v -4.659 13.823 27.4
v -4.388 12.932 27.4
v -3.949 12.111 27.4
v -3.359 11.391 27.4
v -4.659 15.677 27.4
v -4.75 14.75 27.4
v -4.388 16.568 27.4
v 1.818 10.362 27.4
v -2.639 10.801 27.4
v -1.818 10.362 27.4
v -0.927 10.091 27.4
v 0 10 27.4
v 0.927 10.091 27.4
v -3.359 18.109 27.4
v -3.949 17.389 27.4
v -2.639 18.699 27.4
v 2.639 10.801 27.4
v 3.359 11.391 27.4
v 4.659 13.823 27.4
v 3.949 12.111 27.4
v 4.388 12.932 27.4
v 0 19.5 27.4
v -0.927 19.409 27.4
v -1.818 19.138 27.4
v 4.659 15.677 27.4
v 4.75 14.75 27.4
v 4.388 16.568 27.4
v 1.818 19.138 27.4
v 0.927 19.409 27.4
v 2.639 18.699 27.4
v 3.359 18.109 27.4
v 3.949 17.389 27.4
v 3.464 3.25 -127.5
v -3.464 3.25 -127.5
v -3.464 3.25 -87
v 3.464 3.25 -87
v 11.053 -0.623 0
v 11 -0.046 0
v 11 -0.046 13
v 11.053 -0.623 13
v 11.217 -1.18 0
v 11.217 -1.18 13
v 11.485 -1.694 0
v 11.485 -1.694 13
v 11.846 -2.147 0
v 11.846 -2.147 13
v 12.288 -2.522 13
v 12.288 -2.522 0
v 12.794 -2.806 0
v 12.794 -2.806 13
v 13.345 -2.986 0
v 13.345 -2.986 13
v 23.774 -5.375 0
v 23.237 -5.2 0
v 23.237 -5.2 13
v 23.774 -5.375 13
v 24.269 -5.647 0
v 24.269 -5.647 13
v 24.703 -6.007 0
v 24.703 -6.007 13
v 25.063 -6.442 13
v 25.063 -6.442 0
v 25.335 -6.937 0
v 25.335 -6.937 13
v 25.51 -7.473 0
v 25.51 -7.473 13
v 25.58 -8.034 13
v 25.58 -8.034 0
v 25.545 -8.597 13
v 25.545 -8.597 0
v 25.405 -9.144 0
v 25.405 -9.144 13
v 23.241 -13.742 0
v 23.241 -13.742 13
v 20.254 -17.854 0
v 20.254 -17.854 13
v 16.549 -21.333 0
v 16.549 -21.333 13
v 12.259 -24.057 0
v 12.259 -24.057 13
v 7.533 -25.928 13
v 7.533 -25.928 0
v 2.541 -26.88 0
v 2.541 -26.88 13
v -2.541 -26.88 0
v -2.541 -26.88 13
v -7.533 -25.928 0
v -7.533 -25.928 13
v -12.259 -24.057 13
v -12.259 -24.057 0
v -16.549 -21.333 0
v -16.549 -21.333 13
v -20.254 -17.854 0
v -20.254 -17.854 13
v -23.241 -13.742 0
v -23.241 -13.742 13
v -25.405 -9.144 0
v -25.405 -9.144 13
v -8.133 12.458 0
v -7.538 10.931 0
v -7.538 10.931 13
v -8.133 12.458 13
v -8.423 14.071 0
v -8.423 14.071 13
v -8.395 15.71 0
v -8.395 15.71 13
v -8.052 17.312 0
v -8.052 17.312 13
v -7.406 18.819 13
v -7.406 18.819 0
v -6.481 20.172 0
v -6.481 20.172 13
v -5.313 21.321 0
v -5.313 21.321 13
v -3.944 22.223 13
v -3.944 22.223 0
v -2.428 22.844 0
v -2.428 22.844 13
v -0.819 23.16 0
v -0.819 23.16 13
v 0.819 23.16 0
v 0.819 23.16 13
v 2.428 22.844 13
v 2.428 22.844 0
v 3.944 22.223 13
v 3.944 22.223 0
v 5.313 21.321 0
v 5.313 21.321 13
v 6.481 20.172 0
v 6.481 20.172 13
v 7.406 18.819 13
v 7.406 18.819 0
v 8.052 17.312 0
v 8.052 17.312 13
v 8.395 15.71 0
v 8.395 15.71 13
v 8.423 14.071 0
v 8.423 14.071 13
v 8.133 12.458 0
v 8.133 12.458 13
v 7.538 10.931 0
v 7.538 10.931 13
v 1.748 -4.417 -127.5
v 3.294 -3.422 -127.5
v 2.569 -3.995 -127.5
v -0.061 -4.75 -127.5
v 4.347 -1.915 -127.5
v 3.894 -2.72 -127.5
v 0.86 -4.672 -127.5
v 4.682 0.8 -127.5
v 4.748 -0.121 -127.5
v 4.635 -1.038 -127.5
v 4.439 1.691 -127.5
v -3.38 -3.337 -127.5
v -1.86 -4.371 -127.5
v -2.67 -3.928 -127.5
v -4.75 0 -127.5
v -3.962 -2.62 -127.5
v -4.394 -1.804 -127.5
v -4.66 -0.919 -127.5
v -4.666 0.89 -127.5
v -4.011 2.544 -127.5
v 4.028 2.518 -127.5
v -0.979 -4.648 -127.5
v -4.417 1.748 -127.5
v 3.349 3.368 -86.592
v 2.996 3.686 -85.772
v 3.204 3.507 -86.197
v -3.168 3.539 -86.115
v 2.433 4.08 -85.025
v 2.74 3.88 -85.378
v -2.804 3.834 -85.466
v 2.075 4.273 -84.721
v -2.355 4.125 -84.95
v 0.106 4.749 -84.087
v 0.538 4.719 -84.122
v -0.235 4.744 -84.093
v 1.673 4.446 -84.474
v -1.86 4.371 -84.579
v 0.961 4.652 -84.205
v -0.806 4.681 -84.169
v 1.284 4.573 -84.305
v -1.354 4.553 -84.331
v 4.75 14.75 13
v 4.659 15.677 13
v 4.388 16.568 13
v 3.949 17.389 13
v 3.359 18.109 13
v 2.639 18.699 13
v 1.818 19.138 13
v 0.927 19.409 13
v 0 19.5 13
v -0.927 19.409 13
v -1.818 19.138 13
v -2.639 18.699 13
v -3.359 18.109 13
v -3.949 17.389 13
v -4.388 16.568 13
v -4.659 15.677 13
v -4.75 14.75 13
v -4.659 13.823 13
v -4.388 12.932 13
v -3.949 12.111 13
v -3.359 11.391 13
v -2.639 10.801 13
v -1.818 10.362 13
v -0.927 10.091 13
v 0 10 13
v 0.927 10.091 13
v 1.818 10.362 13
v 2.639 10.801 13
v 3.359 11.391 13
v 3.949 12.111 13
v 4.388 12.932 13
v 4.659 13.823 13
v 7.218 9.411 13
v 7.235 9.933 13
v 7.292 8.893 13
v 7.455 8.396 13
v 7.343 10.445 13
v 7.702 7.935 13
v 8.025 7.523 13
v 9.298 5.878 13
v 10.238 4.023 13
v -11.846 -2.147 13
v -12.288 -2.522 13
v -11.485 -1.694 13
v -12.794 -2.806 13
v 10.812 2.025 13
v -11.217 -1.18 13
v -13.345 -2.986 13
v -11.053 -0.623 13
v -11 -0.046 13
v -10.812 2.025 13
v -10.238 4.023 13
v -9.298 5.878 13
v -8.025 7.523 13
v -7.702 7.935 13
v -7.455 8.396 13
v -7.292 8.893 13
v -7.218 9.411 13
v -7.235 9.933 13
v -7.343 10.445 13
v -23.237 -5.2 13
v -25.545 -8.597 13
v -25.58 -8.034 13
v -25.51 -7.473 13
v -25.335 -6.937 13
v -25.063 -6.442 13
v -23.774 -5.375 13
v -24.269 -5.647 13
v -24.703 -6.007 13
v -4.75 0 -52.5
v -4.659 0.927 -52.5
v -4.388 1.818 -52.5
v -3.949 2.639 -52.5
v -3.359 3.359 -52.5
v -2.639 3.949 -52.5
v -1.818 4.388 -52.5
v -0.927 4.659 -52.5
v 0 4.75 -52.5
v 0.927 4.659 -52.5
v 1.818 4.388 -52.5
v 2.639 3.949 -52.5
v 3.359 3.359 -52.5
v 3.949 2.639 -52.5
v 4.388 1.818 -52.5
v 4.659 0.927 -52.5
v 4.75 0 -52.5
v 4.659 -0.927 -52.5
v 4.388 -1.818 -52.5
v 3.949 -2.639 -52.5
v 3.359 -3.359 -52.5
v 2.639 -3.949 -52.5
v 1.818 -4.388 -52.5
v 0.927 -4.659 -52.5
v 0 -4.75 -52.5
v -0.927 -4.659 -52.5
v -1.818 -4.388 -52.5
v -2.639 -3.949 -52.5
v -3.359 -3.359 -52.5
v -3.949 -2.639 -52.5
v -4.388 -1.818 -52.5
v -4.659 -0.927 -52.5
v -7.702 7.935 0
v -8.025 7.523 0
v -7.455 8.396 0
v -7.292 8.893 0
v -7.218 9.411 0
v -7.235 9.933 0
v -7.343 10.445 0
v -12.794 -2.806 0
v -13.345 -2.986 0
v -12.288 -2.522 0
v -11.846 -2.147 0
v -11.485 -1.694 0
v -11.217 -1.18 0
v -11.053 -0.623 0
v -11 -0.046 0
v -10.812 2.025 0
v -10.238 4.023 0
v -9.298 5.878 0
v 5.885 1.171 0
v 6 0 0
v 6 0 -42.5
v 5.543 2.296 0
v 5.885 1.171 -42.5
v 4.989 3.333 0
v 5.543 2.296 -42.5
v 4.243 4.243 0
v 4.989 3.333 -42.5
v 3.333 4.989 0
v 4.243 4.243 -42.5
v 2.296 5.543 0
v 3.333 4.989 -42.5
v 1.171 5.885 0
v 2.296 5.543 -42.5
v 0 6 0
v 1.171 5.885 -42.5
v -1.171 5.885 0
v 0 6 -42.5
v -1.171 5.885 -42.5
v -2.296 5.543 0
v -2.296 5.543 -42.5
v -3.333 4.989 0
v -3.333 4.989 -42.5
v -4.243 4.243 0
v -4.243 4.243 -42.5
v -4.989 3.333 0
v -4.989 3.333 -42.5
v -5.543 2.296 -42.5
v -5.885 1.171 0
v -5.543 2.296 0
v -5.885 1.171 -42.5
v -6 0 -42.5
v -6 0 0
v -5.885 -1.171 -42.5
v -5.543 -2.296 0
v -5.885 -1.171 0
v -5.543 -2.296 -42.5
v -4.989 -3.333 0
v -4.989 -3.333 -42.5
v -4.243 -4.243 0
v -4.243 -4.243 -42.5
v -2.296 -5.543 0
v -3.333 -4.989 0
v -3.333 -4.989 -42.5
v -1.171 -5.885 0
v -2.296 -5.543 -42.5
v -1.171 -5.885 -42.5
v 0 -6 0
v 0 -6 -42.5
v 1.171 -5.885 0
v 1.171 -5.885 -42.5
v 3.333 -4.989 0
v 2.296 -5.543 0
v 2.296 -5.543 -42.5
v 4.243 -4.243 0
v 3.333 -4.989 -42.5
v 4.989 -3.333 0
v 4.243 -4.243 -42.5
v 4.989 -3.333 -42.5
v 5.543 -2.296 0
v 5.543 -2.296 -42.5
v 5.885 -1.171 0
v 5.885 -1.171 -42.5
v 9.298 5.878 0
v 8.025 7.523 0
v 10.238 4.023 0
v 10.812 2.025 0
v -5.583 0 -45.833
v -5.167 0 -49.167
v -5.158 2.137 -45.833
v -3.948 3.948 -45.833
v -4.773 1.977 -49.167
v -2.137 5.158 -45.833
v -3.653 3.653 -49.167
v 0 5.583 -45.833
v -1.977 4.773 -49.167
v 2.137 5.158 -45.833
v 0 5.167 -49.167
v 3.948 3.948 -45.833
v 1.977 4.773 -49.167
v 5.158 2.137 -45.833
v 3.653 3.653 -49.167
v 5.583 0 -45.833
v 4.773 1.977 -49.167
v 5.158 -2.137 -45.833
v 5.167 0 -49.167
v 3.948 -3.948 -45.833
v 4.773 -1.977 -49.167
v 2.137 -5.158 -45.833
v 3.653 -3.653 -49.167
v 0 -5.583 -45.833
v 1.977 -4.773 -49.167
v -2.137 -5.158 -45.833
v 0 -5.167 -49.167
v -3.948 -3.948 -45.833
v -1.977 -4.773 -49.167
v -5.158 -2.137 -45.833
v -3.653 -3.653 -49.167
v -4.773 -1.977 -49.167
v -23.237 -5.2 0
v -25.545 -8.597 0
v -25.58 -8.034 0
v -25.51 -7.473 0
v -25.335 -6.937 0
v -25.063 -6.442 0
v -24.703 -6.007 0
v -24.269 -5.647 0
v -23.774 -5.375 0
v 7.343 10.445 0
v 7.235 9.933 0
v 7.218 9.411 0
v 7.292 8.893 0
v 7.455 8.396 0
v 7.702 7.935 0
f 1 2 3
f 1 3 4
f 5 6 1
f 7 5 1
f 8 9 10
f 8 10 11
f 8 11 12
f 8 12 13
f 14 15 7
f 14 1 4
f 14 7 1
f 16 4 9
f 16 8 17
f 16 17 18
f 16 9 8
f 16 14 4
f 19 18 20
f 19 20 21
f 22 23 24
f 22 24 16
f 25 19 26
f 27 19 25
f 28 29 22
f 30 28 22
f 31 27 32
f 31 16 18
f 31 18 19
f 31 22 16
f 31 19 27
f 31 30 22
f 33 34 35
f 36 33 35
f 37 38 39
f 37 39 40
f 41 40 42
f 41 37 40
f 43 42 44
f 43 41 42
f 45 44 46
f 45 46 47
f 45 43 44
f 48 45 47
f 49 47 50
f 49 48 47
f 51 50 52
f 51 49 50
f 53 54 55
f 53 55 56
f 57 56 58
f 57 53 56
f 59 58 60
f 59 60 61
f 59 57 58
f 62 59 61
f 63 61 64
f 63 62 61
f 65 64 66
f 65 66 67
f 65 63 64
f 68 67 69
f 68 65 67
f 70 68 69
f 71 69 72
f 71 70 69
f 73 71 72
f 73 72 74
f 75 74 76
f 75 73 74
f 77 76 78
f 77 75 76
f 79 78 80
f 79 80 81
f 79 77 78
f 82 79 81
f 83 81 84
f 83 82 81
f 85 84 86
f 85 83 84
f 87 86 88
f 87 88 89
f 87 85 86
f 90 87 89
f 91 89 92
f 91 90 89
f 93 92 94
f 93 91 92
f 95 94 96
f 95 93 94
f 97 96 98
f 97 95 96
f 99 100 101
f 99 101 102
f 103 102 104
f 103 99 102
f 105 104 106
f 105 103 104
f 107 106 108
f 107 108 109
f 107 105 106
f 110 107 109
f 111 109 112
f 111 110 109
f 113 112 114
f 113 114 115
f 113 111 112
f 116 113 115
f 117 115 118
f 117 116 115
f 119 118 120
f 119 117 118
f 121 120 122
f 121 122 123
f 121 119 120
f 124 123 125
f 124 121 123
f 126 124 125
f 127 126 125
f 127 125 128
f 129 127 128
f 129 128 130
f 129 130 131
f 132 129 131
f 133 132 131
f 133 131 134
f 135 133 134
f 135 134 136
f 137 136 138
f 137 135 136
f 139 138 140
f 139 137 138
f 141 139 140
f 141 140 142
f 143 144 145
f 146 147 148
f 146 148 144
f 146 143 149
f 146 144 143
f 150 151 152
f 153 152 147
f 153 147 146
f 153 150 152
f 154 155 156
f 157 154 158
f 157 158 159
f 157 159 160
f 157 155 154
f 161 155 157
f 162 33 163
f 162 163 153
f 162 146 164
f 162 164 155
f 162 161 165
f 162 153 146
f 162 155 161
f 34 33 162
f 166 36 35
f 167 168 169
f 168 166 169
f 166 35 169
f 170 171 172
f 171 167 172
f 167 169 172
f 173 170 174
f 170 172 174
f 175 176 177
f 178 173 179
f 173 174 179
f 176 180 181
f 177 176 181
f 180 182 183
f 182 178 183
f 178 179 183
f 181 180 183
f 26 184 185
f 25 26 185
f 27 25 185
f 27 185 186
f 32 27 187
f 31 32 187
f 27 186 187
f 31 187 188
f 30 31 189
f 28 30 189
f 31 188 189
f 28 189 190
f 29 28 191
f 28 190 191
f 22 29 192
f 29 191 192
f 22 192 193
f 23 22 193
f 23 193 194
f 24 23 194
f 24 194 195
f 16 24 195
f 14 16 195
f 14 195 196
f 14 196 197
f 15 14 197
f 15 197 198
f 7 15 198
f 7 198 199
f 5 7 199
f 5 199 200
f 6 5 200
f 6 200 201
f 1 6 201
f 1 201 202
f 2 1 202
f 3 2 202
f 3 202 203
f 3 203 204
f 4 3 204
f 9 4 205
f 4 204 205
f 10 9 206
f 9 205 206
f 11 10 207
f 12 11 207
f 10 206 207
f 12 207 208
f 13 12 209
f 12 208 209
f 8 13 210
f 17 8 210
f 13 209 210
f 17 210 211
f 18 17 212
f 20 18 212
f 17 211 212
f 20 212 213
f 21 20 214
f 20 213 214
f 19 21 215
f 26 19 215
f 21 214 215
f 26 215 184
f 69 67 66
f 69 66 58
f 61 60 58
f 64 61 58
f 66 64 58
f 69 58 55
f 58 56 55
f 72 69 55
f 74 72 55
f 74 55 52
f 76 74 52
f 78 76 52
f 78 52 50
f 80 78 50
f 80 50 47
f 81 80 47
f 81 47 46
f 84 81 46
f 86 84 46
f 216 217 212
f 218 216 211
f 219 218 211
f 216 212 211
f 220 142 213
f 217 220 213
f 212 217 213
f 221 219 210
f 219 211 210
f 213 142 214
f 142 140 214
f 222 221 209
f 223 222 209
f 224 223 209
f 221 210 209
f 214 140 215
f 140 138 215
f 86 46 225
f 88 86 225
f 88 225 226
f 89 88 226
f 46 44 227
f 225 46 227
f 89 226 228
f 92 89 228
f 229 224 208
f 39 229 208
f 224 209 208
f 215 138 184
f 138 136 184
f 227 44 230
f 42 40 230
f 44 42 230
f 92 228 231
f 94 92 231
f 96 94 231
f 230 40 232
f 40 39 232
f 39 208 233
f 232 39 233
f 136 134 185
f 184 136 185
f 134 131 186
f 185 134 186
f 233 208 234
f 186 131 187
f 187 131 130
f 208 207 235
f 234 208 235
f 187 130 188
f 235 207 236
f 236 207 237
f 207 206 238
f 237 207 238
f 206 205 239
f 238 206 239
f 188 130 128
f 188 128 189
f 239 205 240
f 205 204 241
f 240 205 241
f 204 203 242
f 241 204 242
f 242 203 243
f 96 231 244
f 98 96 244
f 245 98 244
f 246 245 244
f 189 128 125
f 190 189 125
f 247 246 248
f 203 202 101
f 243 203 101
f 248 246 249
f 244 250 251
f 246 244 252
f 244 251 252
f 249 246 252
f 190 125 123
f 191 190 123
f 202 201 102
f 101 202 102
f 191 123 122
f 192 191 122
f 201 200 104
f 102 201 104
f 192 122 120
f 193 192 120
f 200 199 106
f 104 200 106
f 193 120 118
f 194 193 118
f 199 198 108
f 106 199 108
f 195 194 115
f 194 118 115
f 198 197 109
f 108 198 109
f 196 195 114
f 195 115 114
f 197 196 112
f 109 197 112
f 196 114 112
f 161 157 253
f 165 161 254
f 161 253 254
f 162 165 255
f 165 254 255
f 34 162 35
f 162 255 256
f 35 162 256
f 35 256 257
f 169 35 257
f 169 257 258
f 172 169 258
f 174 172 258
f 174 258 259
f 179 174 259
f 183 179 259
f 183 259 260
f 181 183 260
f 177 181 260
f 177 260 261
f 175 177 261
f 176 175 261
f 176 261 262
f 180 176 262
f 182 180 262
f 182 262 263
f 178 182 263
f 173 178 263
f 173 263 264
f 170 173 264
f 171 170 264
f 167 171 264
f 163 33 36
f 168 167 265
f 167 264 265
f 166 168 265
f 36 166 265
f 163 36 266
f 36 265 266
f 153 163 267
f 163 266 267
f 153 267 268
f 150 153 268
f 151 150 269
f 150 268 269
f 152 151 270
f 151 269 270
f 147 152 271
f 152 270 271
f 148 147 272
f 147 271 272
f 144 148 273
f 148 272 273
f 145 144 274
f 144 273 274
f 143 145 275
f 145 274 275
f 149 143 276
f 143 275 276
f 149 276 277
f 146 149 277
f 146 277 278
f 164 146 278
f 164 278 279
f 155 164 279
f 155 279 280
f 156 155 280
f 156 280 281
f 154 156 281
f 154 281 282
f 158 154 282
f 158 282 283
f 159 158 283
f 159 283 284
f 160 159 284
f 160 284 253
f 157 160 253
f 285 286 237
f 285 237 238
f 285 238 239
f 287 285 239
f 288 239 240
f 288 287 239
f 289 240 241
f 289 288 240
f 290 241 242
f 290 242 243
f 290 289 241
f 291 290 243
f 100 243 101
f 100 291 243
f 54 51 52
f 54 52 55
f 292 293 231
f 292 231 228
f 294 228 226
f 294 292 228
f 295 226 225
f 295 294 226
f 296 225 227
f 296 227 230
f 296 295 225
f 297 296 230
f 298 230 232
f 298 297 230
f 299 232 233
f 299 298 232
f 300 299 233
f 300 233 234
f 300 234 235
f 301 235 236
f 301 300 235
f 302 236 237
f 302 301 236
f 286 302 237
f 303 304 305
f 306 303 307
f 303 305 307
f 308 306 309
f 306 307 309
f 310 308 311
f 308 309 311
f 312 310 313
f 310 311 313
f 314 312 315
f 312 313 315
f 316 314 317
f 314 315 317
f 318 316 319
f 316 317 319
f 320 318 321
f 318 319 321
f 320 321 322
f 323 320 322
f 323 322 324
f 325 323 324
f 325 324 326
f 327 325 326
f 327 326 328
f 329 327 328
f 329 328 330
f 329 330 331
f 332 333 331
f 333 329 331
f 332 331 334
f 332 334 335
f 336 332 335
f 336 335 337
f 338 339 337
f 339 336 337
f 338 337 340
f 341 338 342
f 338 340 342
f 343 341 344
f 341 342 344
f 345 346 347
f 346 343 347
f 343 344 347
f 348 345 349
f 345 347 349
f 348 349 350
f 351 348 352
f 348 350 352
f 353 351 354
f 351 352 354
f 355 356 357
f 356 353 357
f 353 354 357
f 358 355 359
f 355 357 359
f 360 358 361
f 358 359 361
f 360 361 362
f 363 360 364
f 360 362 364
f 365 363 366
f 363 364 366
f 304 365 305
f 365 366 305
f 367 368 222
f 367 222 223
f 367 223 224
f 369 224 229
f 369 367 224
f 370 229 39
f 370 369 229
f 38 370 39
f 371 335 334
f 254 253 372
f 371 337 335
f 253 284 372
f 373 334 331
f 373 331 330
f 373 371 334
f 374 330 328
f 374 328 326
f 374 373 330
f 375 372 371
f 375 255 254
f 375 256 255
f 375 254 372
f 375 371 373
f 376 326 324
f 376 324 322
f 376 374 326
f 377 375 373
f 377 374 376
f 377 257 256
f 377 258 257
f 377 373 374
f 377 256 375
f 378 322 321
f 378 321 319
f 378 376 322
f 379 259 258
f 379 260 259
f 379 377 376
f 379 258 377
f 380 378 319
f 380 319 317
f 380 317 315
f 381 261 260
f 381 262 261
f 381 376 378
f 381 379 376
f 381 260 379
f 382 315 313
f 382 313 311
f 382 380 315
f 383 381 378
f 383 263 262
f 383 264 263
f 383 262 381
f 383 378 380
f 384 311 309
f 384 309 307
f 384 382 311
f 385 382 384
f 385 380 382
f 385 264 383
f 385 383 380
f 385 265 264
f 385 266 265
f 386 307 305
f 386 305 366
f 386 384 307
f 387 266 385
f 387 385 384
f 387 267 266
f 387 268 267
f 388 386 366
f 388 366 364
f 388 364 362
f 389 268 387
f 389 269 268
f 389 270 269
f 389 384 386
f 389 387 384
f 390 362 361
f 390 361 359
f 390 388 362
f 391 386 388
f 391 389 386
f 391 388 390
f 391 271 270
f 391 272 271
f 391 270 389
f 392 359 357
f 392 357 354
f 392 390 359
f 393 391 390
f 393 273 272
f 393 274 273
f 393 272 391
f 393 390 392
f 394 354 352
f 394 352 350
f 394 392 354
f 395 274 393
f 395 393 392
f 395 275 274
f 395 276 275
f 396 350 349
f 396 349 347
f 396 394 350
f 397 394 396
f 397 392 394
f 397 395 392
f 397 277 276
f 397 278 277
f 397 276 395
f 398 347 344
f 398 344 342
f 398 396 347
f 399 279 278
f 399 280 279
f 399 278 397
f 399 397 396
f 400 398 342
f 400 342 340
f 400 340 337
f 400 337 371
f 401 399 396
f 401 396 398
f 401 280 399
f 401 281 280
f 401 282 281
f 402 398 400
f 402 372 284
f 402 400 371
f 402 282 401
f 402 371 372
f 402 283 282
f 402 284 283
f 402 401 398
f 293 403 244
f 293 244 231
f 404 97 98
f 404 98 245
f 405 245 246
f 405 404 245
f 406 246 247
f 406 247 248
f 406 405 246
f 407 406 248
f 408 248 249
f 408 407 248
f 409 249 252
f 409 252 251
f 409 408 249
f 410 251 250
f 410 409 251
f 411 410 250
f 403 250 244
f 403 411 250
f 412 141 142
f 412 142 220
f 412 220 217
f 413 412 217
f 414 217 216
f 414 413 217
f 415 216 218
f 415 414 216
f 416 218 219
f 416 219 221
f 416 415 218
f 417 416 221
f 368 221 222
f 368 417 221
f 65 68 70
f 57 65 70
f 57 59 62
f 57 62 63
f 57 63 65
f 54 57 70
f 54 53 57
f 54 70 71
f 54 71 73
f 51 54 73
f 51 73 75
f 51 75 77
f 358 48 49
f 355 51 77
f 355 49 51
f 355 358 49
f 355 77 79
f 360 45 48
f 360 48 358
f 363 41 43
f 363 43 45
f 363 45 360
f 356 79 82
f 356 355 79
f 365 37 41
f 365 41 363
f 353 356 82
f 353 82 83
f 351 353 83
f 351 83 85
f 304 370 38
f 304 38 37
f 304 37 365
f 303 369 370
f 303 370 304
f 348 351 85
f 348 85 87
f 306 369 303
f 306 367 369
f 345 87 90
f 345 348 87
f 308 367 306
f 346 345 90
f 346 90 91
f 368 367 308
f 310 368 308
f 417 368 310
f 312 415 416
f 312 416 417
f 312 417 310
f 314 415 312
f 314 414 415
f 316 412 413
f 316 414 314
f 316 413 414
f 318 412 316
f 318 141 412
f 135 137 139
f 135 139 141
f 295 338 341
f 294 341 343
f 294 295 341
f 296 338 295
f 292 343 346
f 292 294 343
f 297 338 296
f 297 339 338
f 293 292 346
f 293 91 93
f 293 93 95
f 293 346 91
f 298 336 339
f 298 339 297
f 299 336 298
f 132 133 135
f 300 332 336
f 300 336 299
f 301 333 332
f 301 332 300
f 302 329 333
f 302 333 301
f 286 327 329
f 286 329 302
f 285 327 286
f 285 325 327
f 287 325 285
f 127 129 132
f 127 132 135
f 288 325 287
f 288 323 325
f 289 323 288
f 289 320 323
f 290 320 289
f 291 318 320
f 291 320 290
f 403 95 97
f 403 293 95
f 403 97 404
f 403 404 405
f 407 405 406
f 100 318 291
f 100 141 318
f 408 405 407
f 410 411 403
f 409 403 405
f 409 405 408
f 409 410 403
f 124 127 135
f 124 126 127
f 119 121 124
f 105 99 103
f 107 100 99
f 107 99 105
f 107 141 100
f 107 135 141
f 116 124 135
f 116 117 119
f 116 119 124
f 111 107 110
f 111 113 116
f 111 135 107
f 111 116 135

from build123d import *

# Parameters (mm, degrees)
SKETCH1_R                = 6
SKETCH1_R_2              = 4.75
BOSS_EXTRUDE1_DEPTH      = 13
BOSS_EXTRUDE2_DEPTH      = 14.4
BOSS_EXTRUDE2_DEPTH_BACK = 13
SKETCH2_R                = 4.75
BOSS_EXTRUDE3_START      = -55.5
SKETCH3_R                = 6
BOSS_EXTRUDE3_DEPTH      = 55.5
SKETCH4_R                = 4.75
BOSS_EXTRUDE4_DEPTH      = 85
CHAMFER1_SIZE2           = 10
CHAMFER1_SIZE            = 1.25
CUT_EXTRUDE1_DEPTH       = 15
CUT_EXTRUDE1_DEPTH_BACK  = 15


with BuildPart() as part:
    # Sketch1 → Boss-Extrude1 (new body)
    with BuildSketch(Plane.XY):
        with BuildLine():
            Line((-23.236982917, -5.200252391), (-13.344706072, -2.986439328))
            ThreePointArc((-13.344706072, -2.986439328), (-11.654410969, -1.929360589), (-10.999902799, -0.046242948))
            ThreePointArc((-10.999902799, -0.046242948), (-10.237754277, 4.023479509), (-8.025101164, 7.5231477))
            ThreePointArc((-8.025101164, 7.5231477), (-7.243992277, 9.150122037), (-7.537669453, 10.930832655))
            ThreePointArc((-7.537669453, 10.930832655), (0, 23.2), (7.537669453, 10.930832655))
            ThreePointArc((7.537669453, 10.930832655), (7.243992277, 9.150122037), (8.025101164, 7.5231477))
            ThreePointArc((8.025101164, 7.5231477), (10.237754277, 4.023479509), (10.999902799, -0.046242948))
            ThreePointArc((10.999902799, -0.046242948), (11.654410969, -1.929360589), (13.344706072, -2.986439328))
            Line((13.344706072, -2.986439328), (23.236982917, -5.200252391))
            ThreePointArc((23.236982917, -5.200252391), (25.210855565, -6.682799479), (25.404539286, -9.143816691))
            ThreePointArc((25.404539286, -9.143816691), (0, -27), (-25.404539286, -9.143816691))
            ThreePointArc((-25.404539286, -9.143816691), (-25.210855565, -6.682799479), (-23.236982917, -5.200252391))
        make_face()
        with Locations(Location((0, 0, 0), (0, 0, 180))):
            Circle(SKETCH1_R, mode=Mode.SUBTRACT)
        with Locations(Location((0, 14.75, 0), (0, 0, 180))):
            Circle(SKETCH1_R_2, mode=Mode.SUBTRACT)
    extrude(amount=BOSS_EXTRUDE1_DEPTH)

    # Sketch2 → Boss-Extrude2 (add, two sides: drawn at the far end of the back side and taken through both)
    with BuildSketch(Plane.XY.offset(13).offset(-BOSS_EXTRUDE2_DEPTH_BACK)):
        with Locations((0, 14.75)):
            Circle(SKETCH2_R)
    extrude(amount=BOSS_EXTRUDE2_DEPTH + BOSS_EXTRUDE2_DEPTH_BACK)

    # Sketch3 → Boss-Extrude3 (add)
    with BuildSketch(Plane.XY.offset(13).offset(BOSS_EXTRUDE3_START)):
        Circle(SKETCH3_R)
    extrude(amount=BOSS_EXTRUDE3_DEPTH)

    # Sketch4 → Boss-Extrude4 (add)
    with BuildSketch(Plane(origin=(0, 0, -42.5), x_dir=(-1, 0, 0), z_dir=(0, 0, -1))):
        Circle(SKETCH4_R)
    extrude(amount=BOSS_EXTRUDE4_DEPTH)

    # Chamfer1
    chamfer1_edges = [part.edges().sort_by_distance(p)[0] for p in [
        (4.75, 0, -42.5),
    ]]
    chamfer1_side = [part.faces().sort_by_distance(p)[0] for p in [
        (4.775, 0, -42.5),
    ]]
    chamfer(chamfer1_edges, length=CHAMFER1_SIZE - 0.0001, length2=CHAMFER1_SIZE2 - 0.0001, reference=chamfer1_side[0])  # a hair under: the kernel refuses the full size

    # Sketch5 → Cut-Extrude1 (cut, two sides: drawn at the far end of the back side and taken through both)
    with BuildSketch(Plane(origin=(0, 0, 0), x_dir=(0, 0, -1), z_dir=(1, 0, 0)).offset(-CUT_EXTRUDE1_DEPTH_BACK)):
        with BuildLine():
            Line((127.5, 3.25), (87, 3.25))
            ThreePointArc((87, 3.25), (83.953206786, 4.863584298), (81.962073187, 7.678187319))
            Line((81.962073187, 7.678187319), (127.5, 7.678187319))
            Line((127.5, 7.678187319), (127.5, 4.75))
            Line((127.5, 4.75), (127.5, 3.25))
        make_face()
    extrude(amount=CUT_EXTRUDE1_DEPTH + CUT_EXTRUDE1_DEPTH_BACK, mode=Mode.SUBTRACT)


solid = part.part
